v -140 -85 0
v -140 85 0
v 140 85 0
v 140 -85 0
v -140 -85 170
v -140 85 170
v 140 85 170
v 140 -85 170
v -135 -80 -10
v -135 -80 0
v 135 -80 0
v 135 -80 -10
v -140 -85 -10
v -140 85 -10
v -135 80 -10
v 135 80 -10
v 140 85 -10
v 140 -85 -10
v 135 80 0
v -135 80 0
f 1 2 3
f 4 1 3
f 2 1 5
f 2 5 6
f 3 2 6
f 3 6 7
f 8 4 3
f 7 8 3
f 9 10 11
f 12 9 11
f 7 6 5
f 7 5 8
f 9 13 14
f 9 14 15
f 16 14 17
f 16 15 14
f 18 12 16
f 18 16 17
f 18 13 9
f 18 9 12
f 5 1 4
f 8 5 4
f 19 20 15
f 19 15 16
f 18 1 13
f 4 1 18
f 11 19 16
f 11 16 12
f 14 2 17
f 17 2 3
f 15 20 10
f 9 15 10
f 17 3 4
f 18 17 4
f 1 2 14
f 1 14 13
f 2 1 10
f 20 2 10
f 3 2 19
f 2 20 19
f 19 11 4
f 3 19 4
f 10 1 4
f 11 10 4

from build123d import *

# Parameters (mm, degrees)
F0_W     = 280
F0_H     = 170
F1_DEPTH = 170
F2_W     = 280
F2_H     = 170
F2_W_2   = 270
F2_H_2   = 160
F3_DEPTH = 10


with BuildPart() as f1:
    # F0 (on Top) → F1 (new body)
    with BuildSketch(Plane.XY):
        Rectangle(F0_W, F0_H)
    extrude(amount=F1_DEPTH)


with BuildPart() as f3:
    # F2 (on face) → F3 (new body)
    with BuildSketch(Plane(origin=(0, 0, 0), x_dir=(1, 0, 0), z_dir=(0, 0, -1))):
        Rectangle(F2_W, F2_H)
        Rectangle(F2_W_2, F2_H_2, mode=Mode.SUBTRACT)
    extrude(amount=F3_DEPTH)


solid = Compound([f1.part, f3.part])
